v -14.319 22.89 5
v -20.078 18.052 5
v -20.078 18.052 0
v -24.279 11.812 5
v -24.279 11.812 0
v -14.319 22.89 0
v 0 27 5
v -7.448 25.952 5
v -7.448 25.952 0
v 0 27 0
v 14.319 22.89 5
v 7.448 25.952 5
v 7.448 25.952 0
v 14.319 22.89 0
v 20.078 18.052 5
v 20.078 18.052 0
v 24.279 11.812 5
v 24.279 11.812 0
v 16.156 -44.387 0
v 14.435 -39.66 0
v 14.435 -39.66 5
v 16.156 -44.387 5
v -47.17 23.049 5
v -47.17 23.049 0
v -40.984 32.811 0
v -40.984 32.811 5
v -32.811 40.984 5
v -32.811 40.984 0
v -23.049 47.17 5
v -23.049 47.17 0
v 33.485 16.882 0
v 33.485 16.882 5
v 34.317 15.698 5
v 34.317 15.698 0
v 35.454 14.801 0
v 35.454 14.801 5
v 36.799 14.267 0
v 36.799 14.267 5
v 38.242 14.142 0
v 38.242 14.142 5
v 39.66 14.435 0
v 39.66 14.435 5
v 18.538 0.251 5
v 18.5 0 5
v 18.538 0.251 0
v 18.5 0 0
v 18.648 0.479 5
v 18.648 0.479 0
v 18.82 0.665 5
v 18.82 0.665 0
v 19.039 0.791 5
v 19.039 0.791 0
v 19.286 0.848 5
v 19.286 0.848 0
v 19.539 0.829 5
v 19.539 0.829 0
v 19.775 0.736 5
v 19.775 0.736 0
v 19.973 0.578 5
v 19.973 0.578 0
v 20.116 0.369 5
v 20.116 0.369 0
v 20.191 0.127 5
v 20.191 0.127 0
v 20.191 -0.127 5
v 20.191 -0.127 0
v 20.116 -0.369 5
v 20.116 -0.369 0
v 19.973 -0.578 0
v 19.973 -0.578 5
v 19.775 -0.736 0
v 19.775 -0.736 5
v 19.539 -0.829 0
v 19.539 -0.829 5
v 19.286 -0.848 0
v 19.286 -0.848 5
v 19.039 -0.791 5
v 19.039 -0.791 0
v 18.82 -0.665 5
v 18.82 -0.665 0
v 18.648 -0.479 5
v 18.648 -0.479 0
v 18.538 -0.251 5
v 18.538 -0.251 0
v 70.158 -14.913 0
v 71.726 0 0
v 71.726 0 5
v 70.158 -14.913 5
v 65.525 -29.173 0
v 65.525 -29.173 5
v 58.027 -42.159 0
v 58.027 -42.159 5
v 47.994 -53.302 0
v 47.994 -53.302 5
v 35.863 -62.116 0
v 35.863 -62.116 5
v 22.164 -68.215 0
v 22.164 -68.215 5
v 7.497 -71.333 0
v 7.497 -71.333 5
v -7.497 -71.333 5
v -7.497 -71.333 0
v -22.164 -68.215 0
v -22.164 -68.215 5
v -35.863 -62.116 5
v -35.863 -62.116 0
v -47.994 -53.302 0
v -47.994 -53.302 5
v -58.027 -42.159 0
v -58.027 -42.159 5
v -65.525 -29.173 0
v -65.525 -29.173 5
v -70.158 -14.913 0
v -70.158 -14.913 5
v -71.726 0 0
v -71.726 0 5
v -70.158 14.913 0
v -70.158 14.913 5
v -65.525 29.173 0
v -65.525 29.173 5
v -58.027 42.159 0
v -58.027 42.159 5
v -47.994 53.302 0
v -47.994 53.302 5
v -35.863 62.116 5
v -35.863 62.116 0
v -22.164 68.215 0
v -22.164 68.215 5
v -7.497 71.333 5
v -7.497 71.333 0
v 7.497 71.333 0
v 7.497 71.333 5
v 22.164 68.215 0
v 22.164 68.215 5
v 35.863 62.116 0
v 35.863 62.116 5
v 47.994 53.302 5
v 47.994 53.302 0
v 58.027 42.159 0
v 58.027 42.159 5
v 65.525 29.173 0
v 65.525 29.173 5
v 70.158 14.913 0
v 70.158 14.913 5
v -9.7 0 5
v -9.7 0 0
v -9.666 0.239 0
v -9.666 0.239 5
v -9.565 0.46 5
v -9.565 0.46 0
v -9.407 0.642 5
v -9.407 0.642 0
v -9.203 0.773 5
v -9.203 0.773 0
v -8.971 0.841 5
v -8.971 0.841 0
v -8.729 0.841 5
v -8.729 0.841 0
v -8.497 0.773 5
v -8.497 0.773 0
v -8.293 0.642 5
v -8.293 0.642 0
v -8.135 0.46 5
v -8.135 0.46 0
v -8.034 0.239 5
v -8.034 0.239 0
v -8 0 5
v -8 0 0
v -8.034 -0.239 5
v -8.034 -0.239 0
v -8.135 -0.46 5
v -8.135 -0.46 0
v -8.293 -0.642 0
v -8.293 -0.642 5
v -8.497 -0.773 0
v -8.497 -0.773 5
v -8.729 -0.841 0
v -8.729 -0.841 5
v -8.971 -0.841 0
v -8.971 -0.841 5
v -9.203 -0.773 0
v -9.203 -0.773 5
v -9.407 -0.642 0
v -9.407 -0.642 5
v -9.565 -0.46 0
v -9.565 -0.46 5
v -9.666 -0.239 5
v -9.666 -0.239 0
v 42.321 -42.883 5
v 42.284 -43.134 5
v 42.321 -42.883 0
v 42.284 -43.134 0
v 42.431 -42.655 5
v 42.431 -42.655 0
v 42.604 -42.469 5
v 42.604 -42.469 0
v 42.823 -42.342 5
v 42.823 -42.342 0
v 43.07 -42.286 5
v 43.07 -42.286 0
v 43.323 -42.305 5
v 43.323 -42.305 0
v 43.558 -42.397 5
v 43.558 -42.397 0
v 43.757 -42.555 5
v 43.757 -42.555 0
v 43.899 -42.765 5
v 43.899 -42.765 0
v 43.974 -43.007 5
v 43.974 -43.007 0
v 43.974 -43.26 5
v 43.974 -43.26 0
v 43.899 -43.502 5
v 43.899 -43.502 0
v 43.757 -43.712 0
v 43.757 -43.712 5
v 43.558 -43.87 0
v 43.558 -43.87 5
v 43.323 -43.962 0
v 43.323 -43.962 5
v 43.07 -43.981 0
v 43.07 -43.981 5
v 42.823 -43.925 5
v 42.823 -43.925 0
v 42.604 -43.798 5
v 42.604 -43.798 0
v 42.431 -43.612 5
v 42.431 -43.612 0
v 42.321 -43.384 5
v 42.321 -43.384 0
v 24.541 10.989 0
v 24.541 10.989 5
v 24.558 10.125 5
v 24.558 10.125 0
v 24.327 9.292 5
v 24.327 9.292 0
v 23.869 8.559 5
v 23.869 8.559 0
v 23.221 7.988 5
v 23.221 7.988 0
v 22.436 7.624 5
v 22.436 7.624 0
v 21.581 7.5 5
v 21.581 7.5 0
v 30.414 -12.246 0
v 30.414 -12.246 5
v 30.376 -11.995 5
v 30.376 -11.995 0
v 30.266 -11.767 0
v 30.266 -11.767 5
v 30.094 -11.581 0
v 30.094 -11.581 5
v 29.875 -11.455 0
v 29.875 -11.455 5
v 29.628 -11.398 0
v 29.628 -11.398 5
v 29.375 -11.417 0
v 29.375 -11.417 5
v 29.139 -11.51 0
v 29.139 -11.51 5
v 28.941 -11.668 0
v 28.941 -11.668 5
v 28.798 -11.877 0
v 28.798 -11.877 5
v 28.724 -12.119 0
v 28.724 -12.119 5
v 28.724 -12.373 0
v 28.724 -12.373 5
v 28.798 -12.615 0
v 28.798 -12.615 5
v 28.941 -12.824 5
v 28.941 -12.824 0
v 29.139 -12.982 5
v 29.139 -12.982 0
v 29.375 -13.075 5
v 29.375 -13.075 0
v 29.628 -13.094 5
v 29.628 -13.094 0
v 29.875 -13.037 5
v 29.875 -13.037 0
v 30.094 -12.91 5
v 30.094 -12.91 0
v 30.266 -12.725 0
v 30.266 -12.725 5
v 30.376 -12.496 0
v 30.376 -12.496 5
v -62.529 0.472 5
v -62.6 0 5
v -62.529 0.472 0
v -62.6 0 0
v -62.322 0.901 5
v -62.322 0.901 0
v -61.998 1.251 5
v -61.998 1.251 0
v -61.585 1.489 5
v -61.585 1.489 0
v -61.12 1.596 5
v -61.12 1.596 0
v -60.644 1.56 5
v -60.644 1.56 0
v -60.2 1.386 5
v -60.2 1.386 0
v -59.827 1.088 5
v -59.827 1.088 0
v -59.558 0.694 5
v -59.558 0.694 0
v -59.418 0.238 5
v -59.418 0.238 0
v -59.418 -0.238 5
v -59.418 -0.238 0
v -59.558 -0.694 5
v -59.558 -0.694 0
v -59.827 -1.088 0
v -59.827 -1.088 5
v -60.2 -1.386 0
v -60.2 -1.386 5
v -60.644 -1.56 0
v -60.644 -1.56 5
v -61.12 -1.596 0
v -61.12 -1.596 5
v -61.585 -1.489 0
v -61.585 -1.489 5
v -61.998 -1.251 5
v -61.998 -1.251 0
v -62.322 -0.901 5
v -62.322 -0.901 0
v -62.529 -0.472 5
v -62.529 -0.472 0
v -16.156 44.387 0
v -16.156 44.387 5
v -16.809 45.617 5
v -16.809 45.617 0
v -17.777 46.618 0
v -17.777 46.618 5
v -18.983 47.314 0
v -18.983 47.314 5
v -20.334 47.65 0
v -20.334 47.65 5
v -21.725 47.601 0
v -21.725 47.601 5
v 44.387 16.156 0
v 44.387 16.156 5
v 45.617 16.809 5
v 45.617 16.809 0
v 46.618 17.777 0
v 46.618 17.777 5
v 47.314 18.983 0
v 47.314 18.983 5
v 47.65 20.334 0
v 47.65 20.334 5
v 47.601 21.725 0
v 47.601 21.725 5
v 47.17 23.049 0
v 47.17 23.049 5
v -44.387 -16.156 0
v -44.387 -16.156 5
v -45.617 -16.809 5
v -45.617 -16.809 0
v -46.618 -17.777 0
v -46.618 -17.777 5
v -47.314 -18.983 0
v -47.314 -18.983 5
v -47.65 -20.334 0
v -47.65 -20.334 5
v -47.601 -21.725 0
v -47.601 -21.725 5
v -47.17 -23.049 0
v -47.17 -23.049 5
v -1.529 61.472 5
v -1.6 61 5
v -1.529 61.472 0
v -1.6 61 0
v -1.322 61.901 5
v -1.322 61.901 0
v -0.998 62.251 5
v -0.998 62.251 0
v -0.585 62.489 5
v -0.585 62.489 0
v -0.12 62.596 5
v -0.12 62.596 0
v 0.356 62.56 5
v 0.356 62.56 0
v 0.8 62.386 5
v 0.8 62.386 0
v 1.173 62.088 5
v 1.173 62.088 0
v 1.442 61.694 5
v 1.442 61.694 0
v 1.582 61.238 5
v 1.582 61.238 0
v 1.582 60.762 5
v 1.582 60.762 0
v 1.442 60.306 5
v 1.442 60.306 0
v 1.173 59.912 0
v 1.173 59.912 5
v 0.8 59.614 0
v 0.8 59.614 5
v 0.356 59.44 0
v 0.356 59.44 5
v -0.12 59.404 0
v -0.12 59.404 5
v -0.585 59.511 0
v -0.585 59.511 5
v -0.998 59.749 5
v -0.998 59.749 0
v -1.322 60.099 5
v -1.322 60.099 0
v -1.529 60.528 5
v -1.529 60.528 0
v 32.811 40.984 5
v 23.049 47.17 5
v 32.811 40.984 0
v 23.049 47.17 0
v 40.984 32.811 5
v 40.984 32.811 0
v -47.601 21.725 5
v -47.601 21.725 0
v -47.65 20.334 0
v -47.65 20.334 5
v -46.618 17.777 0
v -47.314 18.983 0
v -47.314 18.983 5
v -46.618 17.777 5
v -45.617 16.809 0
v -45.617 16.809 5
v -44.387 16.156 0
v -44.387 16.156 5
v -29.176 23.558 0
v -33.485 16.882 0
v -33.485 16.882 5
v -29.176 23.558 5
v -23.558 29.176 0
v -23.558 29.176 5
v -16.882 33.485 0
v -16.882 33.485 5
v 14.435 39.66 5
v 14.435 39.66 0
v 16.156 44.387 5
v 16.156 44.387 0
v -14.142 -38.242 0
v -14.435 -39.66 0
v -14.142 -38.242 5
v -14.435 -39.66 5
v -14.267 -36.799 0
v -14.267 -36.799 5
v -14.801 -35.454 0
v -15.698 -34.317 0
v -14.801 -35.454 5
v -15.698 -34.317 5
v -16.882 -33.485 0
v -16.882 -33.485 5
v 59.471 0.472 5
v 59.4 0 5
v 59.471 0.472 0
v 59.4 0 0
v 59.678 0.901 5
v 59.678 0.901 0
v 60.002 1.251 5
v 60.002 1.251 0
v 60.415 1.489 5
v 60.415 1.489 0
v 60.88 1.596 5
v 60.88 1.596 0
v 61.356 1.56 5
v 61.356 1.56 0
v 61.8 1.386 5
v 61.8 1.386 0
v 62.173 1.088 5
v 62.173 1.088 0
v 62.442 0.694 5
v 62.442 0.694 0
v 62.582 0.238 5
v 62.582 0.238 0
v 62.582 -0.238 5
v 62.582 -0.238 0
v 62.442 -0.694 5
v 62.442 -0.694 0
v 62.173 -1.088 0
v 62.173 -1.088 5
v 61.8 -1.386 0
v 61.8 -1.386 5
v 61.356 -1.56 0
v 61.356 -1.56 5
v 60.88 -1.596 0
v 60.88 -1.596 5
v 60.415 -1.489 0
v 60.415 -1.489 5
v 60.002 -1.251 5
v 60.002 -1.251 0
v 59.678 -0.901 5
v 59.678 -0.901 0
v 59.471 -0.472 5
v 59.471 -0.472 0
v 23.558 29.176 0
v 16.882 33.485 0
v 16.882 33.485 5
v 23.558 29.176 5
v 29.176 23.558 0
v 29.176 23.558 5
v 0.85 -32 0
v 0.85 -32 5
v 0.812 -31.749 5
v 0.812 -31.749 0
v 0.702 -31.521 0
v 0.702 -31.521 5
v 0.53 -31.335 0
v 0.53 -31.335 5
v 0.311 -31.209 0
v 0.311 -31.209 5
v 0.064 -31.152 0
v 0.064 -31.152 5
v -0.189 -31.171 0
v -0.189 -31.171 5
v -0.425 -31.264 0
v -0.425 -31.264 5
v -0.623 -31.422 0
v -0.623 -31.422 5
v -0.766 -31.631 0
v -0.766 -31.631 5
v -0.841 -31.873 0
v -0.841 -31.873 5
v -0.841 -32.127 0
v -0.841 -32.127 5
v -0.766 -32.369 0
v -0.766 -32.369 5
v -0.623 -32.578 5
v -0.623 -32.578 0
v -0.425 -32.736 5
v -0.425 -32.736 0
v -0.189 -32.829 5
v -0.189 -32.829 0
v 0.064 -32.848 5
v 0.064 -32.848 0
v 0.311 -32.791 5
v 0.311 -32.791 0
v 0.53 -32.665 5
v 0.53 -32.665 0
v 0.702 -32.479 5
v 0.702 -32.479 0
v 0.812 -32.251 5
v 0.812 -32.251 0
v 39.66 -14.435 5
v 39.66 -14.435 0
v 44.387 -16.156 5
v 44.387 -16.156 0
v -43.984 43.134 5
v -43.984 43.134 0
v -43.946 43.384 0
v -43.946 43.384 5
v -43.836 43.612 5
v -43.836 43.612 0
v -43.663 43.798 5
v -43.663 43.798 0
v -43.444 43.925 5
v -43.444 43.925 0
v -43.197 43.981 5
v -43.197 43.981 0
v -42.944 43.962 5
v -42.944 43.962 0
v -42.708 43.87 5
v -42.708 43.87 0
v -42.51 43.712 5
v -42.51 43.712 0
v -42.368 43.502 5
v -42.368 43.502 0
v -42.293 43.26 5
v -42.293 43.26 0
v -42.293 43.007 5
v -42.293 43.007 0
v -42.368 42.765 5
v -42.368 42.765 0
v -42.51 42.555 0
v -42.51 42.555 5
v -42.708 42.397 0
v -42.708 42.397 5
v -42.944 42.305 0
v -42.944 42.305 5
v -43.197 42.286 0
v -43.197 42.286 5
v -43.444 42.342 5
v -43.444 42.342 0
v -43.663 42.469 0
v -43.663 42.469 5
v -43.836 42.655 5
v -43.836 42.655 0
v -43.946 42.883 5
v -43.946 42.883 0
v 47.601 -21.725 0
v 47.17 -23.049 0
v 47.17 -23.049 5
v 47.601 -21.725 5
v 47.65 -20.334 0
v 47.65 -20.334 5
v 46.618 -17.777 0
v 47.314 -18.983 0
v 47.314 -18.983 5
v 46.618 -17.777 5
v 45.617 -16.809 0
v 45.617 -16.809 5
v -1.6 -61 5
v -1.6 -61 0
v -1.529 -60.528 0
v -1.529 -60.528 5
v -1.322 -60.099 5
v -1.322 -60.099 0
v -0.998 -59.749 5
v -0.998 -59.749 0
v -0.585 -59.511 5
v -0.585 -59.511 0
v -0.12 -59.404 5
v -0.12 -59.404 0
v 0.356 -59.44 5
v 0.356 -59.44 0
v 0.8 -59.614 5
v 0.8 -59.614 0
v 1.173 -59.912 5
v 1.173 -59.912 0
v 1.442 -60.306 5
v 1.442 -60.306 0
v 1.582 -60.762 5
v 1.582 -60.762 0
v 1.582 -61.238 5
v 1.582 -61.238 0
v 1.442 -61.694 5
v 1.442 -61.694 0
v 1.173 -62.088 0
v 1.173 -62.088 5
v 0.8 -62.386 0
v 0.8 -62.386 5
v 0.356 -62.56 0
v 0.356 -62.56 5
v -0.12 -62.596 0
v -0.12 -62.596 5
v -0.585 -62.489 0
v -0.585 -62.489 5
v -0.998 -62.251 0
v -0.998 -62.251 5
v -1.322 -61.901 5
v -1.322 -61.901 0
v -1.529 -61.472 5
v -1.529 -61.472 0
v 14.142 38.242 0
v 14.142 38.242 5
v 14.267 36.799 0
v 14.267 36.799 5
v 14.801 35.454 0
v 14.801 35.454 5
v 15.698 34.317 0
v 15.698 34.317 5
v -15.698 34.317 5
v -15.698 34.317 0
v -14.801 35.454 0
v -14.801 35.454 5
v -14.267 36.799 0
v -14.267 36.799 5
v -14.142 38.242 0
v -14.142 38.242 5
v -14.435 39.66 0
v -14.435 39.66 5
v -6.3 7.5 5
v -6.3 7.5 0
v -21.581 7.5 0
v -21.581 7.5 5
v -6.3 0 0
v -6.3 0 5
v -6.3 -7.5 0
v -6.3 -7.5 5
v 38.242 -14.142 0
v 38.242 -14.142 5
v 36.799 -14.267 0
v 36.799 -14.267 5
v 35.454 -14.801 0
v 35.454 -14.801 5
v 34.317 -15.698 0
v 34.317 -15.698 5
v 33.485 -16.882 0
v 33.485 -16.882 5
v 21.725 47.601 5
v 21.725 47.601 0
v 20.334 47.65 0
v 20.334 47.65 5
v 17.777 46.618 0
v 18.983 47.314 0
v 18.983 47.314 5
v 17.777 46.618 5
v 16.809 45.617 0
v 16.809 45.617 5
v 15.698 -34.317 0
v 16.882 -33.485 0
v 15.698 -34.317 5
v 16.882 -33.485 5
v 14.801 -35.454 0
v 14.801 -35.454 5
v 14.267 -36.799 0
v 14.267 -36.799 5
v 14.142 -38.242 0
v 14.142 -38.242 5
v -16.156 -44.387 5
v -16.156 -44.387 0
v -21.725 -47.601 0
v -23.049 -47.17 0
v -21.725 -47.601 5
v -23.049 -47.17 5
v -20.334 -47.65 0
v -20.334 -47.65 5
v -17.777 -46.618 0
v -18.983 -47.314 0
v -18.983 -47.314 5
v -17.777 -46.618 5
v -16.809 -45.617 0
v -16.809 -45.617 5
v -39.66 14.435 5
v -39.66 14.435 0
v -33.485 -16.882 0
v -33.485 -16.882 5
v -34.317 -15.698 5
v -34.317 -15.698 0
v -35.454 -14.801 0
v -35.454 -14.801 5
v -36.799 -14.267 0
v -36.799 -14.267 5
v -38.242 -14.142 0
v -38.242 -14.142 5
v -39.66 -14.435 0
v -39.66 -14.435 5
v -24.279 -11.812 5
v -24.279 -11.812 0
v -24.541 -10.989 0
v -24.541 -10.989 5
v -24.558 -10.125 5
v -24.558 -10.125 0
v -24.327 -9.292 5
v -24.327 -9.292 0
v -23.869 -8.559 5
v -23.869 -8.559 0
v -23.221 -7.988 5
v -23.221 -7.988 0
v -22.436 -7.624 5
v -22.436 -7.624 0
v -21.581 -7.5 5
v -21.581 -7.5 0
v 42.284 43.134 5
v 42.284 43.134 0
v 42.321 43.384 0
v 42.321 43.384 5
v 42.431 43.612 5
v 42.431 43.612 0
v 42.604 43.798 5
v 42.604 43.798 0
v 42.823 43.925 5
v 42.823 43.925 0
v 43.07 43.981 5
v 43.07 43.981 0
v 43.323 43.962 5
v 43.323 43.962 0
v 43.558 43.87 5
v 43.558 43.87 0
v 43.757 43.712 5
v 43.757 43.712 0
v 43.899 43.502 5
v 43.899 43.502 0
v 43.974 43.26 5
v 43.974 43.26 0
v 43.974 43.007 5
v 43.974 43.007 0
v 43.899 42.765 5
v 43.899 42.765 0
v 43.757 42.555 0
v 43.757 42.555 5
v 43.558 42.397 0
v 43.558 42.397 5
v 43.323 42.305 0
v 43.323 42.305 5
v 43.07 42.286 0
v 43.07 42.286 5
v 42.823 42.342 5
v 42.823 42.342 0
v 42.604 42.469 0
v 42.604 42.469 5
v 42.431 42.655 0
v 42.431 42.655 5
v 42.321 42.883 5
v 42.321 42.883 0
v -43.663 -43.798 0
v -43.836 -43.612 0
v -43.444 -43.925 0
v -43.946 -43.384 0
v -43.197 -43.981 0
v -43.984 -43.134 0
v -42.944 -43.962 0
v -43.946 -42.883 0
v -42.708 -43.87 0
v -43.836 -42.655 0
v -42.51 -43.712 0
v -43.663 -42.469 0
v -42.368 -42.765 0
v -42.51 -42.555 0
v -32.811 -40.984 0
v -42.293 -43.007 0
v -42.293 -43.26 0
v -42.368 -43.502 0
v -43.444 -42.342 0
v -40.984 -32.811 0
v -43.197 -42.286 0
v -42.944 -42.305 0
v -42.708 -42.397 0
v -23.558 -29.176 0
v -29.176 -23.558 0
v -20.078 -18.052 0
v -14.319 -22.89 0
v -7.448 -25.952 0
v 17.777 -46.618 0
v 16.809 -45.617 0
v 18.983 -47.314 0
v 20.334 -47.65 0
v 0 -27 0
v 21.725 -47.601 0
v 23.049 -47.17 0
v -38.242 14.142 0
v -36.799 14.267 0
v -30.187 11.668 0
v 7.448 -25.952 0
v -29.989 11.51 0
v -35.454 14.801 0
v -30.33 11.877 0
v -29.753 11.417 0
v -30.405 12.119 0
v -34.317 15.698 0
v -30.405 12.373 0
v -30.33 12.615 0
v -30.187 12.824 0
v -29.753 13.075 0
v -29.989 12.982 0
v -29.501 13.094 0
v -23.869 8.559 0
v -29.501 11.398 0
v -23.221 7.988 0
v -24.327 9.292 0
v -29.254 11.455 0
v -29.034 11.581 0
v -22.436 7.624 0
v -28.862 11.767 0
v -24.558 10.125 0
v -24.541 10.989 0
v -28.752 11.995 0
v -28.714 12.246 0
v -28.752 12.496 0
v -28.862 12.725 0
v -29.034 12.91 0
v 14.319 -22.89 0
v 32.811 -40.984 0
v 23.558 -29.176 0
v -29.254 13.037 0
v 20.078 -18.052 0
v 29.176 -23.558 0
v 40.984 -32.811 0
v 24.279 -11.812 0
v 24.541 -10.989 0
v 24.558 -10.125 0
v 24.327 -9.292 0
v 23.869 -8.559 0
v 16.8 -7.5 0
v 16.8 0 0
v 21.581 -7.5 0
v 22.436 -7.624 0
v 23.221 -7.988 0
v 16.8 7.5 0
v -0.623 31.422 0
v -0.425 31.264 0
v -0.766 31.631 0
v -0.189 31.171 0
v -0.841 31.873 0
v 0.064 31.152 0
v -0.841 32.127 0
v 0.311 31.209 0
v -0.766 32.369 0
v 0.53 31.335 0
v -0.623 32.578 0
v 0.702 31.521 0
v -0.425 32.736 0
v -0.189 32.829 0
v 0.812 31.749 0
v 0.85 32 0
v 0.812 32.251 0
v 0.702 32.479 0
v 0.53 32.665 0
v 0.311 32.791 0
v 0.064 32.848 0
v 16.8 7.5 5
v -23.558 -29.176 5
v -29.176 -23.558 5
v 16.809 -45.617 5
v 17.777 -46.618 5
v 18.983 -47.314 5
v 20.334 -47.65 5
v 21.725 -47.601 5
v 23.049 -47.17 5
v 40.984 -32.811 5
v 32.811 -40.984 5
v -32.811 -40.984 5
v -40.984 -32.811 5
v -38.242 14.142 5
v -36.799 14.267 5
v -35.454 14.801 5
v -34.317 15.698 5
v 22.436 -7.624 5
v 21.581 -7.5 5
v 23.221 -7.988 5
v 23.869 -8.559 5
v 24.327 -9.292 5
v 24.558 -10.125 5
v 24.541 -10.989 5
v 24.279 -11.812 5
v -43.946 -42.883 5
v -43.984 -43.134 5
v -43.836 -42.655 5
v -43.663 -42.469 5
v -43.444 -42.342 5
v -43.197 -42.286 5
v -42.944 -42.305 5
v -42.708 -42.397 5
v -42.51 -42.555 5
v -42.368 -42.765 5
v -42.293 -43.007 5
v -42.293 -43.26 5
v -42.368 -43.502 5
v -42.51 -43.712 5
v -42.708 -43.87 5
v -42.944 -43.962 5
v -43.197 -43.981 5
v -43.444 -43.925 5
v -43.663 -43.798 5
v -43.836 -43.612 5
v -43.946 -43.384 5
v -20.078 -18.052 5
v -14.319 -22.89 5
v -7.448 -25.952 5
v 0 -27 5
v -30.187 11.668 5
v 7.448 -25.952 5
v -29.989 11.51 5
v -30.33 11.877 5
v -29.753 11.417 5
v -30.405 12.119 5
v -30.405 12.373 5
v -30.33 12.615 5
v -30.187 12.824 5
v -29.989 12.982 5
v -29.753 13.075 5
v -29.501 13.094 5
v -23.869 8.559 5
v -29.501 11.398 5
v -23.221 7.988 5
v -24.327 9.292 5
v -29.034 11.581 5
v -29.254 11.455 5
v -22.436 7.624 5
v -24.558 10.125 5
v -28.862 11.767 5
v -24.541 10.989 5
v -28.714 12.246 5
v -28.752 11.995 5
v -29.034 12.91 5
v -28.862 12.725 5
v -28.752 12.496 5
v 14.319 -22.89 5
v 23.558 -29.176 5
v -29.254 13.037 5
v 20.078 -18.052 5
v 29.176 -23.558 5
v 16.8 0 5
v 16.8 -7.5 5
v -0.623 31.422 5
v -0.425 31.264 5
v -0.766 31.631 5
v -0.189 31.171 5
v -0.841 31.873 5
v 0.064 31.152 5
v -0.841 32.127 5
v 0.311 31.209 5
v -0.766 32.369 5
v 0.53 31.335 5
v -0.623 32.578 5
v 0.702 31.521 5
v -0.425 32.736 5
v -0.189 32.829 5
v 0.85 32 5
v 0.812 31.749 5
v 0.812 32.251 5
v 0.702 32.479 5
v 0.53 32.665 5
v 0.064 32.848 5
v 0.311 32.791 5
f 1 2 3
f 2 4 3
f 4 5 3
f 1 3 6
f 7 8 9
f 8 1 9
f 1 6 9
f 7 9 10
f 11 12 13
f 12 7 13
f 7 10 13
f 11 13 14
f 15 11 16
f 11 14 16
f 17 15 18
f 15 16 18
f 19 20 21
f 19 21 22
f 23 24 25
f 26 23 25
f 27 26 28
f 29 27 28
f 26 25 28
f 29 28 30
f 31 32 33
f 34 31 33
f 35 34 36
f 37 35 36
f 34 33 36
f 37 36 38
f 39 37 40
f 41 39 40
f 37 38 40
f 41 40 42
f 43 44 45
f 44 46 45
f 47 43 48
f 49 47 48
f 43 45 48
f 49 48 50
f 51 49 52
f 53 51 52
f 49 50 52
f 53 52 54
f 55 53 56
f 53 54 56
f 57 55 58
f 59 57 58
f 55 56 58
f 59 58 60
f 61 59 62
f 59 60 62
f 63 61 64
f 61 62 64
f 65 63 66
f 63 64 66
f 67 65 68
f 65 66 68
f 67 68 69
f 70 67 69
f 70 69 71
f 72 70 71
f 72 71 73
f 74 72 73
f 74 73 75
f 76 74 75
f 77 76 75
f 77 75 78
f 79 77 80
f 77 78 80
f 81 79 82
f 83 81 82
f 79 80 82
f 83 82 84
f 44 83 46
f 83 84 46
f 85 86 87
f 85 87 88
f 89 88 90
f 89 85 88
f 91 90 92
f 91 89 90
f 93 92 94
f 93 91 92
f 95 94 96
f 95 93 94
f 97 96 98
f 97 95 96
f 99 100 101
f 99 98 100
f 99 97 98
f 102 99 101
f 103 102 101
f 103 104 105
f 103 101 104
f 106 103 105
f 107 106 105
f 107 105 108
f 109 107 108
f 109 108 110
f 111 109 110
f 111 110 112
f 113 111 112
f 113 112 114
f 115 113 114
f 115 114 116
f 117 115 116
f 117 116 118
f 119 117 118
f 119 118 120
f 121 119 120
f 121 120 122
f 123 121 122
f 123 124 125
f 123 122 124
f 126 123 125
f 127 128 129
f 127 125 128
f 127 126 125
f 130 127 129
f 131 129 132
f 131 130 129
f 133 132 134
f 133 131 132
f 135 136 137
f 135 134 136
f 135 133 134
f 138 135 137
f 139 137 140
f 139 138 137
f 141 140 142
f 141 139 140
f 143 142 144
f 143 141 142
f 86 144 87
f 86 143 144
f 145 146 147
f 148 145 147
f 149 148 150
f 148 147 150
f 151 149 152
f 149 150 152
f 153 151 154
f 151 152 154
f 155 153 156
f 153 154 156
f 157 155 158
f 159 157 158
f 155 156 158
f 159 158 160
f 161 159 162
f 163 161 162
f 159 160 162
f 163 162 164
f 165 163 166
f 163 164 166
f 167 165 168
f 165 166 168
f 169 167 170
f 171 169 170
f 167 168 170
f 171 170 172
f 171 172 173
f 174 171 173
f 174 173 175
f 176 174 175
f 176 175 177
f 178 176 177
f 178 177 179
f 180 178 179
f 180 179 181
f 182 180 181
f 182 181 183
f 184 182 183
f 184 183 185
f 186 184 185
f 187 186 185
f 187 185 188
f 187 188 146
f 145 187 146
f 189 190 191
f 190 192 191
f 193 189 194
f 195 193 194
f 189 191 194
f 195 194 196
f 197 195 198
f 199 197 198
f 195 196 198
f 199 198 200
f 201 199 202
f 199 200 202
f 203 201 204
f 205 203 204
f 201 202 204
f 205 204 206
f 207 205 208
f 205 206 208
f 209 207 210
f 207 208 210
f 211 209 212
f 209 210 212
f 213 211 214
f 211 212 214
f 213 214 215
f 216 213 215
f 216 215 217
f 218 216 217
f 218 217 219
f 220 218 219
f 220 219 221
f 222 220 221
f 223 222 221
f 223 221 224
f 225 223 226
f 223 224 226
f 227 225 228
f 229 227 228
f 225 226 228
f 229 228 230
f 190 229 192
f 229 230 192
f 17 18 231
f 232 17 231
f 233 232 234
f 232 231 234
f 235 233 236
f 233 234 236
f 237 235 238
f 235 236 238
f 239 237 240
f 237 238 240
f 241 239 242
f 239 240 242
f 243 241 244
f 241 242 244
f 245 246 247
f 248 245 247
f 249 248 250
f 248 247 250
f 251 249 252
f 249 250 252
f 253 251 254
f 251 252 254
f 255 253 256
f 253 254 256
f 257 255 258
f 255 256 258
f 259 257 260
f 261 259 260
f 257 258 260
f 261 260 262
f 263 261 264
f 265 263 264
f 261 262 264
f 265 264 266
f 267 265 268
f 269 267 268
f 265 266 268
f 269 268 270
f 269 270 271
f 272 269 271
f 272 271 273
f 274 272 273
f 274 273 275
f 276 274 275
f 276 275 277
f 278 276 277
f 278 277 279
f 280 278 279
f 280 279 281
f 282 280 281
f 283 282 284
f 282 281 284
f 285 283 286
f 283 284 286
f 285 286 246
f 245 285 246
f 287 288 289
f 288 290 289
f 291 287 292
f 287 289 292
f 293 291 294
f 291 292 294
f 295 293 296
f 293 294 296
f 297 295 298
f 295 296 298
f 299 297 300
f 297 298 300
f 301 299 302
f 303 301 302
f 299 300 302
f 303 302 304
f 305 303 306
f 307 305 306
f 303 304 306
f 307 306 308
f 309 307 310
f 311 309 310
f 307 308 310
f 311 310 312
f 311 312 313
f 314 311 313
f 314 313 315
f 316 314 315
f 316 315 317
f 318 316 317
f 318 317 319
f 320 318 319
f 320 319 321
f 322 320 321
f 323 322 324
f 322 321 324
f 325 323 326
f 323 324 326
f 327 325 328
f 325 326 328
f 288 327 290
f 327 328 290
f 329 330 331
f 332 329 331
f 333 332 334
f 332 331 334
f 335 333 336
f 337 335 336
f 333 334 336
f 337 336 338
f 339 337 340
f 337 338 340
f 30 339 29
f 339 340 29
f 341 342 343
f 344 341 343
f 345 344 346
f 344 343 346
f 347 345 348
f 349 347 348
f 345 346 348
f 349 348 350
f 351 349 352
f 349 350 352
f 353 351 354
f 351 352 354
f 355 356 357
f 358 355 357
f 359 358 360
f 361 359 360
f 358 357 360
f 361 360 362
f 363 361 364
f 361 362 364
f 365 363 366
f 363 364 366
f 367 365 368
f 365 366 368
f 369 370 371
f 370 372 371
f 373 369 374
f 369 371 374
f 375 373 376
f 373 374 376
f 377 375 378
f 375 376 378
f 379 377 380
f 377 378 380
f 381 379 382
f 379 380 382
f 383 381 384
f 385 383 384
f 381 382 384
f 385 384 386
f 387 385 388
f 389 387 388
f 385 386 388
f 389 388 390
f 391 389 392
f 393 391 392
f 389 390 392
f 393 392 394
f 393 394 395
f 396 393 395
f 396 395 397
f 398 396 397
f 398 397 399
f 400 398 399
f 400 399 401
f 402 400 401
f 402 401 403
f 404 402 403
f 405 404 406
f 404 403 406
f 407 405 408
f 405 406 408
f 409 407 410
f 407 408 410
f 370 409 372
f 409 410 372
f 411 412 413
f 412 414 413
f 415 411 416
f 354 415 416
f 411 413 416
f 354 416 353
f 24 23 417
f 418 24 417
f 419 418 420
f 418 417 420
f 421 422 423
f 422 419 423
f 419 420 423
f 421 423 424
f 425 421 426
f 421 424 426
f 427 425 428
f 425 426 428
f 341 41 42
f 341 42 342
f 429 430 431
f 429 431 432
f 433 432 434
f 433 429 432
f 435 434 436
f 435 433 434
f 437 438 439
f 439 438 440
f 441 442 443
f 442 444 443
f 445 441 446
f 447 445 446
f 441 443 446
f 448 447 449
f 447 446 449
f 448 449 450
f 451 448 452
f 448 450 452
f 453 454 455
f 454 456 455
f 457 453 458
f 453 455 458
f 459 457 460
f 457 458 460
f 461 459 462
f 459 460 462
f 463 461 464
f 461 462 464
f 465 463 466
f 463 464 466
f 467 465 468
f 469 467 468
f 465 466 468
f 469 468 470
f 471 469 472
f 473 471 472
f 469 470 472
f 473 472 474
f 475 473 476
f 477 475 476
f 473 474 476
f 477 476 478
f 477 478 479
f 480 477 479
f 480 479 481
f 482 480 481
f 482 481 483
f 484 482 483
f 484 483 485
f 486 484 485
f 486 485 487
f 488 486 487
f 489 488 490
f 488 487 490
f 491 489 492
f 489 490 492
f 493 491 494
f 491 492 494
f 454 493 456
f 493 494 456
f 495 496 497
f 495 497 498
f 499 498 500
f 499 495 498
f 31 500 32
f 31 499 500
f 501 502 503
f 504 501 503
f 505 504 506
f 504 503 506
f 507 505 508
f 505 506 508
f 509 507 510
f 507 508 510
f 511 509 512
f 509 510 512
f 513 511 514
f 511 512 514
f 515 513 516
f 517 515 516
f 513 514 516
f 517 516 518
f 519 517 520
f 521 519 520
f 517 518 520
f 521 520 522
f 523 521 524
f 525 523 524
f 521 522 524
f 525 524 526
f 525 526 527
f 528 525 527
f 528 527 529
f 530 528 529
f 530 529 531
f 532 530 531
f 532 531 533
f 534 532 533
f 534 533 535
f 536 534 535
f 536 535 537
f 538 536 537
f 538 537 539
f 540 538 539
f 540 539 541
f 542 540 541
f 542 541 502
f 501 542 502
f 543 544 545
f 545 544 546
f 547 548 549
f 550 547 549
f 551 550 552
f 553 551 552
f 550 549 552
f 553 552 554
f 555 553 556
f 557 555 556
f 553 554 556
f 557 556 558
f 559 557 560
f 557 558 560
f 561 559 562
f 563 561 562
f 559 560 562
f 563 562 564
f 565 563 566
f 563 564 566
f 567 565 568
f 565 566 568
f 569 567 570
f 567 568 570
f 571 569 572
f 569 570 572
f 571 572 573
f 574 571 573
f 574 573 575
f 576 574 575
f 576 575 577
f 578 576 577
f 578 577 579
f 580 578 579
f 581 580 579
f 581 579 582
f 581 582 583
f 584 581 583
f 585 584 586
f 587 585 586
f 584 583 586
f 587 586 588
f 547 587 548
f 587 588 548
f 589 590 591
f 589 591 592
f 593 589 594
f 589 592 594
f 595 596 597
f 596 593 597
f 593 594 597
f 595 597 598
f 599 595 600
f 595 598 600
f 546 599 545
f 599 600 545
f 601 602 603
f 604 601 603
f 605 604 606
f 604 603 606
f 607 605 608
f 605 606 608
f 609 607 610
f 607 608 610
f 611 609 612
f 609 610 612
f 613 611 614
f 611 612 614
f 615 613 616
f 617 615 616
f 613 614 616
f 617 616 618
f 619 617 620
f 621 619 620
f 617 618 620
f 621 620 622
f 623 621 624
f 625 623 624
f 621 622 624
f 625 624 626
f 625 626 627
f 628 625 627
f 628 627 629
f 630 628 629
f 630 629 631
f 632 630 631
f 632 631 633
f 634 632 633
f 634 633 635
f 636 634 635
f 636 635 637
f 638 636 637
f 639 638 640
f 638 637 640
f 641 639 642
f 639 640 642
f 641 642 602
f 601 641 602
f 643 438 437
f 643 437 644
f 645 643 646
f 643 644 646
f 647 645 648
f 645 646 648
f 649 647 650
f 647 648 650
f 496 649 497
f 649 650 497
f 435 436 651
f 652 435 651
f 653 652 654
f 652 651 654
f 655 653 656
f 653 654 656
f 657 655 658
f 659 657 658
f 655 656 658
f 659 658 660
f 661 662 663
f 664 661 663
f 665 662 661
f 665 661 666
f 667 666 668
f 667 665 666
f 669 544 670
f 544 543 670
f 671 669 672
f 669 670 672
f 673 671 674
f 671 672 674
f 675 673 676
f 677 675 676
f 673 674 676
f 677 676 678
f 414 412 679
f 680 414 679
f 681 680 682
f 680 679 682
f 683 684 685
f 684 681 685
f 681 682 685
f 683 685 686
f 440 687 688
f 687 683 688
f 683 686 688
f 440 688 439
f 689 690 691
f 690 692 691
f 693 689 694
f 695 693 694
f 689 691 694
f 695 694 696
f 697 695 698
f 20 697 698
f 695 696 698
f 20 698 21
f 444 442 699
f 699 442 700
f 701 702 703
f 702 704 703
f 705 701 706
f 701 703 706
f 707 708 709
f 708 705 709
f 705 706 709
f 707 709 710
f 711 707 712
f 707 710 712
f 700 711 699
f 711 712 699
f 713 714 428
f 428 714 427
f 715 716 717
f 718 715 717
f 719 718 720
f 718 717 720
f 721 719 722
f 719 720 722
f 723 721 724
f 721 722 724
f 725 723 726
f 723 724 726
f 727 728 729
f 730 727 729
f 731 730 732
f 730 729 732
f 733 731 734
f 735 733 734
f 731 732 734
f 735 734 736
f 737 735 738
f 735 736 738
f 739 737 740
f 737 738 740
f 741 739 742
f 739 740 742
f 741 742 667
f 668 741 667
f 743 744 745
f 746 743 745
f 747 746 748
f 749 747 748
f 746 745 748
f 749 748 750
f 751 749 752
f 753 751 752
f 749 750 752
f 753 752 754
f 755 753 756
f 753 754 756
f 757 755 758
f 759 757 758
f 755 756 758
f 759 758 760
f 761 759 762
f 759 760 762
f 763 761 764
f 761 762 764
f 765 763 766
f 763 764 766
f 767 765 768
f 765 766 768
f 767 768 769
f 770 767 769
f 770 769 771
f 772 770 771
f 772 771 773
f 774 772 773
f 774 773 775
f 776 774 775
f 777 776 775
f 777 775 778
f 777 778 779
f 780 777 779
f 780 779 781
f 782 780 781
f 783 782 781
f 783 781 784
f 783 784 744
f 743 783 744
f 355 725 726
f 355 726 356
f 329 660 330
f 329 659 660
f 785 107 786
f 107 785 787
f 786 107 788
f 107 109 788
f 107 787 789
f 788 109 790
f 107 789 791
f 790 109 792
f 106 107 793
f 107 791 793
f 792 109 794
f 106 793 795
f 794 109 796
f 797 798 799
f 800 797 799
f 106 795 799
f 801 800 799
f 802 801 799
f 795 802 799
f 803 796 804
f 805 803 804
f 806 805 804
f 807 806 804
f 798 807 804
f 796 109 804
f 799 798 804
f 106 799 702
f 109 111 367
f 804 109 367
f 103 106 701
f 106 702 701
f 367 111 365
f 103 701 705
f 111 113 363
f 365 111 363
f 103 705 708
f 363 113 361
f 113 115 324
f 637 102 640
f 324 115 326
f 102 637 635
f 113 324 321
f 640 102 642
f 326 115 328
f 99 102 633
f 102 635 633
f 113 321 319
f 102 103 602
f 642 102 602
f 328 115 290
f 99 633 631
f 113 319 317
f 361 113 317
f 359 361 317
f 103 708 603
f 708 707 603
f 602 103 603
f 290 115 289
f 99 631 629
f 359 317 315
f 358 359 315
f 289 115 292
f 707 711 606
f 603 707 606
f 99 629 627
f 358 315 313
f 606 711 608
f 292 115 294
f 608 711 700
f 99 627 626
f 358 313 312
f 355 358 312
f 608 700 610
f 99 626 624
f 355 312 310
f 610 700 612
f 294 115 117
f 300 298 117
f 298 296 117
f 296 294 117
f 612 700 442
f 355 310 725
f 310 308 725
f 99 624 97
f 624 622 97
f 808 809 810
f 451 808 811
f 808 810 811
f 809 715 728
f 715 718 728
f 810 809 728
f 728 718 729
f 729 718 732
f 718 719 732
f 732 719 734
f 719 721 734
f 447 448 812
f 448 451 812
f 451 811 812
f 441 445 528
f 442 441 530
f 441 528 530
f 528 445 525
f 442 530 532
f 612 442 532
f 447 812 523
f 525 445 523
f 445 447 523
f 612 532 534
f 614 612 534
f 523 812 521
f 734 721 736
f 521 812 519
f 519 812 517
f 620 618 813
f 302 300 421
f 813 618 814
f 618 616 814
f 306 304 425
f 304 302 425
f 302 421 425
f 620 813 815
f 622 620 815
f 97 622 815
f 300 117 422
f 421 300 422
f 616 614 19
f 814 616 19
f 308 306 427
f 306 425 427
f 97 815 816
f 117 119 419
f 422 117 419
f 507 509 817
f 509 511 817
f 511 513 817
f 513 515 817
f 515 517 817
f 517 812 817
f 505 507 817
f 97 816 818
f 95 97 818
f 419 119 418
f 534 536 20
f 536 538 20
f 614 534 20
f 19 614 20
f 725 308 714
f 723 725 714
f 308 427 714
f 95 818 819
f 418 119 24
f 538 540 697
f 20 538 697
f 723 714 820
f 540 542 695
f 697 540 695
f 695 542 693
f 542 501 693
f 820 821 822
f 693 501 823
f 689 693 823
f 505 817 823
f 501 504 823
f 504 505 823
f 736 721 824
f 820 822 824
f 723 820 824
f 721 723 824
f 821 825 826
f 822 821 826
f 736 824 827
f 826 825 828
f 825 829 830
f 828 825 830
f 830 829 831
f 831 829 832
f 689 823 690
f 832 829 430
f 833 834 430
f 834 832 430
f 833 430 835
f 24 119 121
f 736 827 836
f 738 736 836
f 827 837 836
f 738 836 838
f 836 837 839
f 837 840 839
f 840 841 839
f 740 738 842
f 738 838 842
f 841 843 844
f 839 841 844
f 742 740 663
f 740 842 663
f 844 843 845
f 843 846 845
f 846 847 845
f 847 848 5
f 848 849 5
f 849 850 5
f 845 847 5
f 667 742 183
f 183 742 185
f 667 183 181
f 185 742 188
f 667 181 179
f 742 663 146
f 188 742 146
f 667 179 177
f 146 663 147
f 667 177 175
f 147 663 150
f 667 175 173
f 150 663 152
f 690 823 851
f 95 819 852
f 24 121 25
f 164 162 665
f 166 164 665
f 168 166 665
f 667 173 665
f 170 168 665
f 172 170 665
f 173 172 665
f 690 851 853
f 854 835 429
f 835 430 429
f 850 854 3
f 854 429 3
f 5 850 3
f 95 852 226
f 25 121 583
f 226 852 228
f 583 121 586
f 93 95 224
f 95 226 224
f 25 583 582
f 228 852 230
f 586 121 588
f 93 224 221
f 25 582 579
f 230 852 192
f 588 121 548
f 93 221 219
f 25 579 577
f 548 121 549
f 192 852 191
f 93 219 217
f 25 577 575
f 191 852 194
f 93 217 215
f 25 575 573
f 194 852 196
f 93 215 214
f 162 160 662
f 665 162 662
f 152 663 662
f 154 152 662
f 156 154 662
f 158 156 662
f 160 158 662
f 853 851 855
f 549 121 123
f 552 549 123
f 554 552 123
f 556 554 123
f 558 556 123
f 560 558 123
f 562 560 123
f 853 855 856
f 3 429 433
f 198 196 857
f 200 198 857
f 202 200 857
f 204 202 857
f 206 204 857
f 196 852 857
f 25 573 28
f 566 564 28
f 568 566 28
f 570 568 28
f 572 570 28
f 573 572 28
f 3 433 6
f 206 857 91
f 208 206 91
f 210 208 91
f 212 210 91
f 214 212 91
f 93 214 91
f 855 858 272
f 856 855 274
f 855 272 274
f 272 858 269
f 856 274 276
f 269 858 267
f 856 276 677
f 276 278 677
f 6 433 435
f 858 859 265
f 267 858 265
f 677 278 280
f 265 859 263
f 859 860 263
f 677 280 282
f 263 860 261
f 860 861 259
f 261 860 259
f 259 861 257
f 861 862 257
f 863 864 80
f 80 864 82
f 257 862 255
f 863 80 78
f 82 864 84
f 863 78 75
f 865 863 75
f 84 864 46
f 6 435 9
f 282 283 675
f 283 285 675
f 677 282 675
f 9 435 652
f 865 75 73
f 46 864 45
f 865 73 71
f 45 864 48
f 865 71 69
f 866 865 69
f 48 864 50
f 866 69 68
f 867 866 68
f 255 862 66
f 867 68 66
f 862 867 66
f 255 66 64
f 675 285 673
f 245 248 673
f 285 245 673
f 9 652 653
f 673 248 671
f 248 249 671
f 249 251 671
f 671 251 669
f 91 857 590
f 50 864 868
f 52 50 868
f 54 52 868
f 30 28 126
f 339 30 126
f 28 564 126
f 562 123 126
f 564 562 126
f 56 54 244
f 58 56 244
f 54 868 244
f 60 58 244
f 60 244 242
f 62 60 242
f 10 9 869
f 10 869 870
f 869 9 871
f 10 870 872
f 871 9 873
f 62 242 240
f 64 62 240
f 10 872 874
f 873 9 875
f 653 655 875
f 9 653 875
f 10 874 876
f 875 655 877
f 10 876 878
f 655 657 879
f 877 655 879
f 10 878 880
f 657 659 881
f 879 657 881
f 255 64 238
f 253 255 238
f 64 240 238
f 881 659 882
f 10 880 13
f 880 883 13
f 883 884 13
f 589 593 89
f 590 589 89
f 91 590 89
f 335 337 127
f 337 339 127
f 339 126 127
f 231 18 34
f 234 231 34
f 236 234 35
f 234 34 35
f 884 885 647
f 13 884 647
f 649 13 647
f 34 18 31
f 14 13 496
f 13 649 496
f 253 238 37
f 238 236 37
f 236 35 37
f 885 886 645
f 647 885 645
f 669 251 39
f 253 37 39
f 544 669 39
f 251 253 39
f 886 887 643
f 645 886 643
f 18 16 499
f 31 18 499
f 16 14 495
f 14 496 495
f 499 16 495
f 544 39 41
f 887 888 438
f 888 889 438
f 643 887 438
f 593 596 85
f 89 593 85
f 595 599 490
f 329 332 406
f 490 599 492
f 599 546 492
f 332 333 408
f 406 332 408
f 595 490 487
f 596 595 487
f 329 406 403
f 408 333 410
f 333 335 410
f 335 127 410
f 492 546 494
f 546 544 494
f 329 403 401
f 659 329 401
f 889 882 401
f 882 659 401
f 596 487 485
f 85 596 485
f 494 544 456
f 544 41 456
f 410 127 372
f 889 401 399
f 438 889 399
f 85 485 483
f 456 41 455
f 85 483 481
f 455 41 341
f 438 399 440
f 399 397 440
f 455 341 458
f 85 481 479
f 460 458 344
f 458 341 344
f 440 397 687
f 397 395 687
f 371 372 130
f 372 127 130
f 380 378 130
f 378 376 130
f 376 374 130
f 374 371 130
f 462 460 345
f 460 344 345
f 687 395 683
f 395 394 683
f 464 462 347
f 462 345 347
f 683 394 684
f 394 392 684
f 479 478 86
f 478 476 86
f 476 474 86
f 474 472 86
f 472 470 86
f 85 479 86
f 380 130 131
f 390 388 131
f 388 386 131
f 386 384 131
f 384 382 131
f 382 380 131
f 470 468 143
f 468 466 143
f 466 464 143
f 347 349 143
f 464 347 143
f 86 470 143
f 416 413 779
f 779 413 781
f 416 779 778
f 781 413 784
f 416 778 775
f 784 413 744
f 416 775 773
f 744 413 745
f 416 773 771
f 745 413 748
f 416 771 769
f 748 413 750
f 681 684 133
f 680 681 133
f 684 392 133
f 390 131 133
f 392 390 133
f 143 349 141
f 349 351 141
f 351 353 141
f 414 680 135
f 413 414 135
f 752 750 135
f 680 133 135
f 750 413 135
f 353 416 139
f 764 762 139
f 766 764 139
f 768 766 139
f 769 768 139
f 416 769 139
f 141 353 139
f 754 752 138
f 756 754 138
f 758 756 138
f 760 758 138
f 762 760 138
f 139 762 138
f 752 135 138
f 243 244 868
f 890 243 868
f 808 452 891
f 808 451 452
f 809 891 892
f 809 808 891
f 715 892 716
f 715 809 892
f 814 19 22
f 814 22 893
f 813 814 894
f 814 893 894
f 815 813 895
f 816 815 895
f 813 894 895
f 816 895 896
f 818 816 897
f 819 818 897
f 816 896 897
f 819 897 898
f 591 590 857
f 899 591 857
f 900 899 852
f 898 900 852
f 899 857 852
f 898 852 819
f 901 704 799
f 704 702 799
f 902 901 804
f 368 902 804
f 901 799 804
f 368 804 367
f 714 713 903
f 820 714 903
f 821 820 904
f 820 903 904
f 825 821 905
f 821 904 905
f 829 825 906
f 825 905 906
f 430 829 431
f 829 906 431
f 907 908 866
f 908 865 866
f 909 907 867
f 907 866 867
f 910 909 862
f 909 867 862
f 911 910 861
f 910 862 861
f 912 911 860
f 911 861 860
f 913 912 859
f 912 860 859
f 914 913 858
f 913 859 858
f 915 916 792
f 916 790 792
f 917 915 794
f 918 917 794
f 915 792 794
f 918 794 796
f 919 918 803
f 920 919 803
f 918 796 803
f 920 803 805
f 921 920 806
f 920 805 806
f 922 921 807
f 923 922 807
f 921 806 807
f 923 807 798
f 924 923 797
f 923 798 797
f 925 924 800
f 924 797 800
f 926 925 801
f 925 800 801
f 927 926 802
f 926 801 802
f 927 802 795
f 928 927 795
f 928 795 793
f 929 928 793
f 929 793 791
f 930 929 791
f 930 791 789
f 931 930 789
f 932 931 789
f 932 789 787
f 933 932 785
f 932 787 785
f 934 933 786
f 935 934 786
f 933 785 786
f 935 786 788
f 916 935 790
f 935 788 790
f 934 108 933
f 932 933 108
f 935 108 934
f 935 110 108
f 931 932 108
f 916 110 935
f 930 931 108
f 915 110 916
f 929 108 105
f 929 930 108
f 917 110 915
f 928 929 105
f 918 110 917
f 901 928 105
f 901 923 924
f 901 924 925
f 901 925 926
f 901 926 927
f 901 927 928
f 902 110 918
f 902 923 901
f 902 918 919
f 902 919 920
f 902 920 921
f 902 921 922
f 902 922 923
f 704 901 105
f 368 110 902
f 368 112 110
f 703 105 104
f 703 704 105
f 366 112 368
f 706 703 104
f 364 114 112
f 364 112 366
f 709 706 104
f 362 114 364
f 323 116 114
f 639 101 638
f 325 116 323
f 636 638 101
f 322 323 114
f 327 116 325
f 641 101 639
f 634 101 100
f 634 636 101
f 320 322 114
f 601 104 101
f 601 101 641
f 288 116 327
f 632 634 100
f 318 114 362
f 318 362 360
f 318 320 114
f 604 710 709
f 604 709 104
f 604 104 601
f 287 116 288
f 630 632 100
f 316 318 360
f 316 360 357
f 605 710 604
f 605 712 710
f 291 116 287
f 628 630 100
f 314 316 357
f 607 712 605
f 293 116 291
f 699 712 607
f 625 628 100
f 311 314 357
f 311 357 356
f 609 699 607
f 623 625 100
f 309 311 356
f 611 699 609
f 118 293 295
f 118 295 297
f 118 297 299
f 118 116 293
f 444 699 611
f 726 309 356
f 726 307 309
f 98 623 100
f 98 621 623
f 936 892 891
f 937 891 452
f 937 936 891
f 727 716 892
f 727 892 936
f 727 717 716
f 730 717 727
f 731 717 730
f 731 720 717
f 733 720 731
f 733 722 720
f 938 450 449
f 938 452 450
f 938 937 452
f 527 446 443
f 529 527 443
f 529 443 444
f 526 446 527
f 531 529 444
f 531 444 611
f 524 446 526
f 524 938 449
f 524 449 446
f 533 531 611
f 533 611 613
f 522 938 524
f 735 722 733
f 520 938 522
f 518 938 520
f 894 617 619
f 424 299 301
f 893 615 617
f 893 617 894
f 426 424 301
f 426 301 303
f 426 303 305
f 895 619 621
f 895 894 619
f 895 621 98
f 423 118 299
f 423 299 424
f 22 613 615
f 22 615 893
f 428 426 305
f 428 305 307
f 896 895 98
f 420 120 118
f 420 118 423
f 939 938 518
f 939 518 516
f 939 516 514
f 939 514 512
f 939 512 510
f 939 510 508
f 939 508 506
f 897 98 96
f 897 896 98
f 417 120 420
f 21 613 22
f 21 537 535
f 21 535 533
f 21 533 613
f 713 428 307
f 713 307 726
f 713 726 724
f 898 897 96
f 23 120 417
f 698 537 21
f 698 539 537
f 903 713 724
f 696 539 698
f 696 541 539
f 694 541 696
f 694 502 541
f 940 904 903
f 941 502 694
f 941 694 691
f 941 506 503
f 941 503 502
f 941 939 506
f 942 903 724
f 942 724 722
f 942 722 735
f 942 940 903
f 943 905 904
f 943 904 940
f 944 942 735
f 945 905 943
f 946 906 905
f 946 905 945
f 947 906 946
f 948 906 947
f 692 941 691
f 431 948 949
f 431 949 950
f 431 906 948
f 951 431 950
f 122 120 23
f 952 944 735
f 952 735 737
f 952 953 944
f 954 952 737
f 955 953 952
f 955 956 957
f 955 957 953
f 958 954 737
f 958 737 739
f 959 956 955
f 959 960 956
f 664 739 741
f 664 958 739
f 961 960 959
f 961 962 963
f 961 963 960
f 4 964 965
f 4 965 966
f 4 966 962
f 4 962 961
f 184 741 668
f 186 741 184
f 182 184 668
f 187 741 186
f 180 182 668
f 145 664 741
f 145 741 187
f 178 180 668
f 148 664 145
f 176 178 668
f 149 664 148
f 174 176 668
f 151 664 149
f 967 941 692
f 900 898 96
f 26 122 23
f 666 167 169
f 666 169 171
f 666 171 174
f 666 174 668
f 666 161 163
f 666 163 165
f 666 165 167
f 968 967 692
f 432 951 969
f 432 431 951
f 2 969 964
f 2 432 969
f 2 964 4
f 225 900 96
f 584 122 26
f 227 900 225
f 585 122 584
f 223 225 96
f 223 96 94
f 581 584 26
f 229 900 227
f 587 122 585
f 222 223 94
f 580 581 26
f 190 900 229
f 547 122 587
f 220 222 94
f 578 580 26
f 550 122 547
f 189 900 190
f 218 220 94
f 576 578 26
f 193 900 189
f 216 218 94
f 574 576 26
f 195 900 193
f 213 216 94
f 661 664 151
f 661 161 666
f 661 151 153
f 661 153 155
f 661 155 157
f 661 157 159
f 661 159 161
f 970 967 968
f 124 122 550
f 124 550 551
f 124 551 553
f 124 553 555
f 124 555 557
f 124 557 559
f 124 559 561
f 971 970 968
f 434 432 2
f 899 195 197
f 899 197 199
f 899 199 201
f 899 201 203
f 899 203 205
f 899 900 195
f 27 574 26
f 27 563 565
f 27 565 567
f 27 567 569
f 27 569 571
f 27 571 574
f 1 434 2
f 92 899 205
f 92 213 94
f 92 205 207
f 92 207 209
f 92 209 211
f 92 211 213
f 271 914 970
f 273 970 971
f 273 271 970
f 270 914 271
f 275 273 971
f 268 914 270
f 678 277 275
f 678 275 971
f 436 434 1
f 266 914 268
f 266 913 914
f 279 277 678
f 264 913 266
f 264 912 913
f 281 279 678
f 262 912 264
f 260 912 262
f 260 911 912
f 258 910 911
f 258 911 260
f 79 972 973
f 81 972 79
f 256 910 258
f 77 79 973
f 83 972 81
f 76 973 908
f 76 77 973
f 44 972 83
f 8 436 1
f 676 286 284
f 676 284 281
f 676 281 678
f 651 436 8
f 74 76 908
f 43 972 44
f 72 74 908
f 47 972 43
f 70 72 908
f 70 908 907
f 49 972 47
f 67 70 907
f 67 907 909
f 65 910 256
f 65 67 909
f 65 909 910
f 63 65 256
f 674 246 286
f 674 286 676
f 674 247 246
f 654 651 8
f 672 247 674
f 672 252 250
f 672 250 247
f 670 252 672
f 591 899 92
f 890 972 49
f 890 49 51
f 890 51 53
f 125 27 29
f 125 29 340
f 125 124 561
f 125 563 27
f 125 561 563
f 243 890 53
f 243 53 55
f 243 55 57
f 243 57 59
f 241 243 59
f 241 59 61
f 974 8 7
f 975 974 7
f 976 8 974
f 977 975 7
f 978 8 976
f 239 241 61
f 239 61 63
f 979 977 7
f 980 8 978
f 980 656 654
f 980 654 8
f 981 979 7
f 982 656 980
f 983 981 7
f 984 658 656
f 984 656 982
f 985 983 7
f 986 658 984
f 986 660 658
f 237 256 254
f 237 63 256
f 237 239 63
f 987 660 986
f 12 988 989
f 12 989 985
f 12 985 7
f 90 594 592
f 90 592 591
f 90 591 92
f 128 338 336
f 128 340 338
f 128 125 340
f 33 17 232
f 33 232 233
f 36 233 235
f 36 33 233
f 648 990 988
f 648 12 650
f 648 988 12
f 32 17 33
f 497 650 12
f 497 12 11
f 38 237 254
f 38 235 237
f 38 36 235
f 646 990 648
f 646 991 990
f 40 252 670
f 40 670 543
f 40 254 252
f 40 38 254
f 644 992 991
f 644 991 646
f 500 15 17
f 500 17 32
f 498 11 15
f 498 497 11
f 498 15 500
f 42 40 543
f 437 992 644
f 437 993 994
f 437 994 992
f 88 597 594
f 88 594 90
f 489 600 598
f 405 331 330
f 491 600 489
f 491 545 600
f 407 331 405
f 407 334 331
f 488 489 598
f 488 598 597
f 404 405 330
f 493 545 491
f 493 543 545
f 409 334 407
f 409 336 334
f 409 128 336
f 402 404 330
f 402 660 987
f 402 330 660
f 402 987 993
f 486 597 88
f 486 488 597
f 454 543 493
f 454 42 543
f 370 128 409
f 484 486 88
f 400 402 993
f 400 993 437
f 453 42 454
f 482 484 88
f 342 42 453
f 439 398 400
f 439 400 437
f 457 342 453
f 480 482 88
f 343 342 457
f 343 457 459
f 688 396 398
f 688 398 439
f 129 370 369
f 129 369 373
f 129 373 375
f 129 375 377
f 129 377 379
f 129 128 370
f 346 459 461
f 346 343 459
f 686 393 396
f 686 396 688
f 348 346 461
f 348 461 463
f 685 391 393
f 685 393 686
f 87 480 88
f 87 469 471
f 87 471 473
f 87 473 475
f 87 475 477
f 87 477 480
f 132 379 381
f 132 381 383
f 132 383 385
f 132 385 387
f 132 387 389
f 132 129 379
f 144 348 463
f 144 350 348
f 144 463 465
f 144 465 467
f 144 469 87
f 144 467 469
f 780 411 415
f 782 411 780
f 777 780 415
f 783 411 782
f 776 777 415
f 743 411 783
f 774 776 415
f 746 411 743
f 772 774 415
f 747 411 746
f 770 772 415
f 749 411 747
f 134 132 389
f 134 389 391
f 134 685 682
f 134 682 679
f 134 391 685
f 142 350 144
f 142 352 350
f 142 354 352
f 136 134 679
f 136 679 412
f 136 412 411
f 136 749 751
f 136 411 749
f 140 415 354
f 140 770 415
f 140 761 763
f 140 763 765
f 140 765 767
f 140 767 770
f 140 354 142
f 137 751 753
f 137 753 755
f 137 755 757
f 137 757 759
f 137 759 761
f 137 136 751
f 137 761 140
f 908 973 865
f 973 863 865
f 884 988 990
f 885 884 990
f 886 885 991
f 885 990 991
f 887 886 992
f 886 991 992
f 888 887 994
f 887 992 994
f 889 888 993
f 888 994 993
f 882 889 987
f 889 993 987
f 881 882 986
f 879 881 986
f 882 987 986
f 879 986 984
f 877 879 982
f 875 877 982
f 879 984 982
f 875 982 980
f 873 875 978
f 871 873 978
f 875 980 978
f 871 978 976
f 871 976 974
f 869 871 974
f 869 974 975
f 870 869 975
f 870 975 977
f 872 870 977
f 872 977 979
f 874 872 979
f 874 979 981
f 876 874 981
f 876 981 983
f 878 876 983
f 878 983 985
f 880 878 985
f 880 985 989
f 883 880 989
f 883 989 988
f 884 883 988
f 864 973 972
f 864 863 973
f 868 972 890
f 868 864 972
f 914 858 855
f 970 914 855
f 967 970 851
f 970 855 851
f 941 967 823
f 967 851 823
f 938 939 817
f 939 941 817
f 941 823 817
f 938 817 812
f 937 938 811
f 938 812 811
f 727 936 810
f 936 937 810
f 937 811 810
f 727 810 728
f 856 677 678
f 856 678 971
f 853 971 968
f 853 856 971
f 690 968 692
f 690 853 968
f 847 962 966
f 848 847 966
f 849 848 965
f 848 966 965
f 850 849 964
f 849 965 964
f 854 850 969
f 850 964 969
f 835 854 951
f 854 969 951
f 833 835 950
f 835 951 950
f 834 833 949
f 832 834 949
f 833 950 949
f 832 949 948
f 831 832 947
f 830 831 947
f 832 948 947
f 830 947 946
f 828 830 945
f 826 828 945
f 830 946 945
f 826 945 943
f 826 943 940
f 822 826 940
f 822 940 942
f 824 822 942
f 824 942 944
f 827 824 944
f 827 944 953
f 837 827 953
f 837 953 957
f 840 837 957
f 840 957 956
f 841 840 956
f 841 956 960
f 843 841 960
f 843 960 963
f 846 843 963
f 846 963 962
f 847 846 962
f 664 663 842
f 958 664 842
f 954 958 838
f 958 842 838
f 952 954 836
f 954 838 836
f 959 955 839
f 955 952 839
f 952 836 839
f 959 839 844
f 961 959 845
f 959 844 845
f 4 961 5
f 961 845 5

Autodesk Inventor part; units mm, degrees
ref_plane "YZ Plane" through (0, 0, 0) normal (1, 0, 0) x (0, 1, 0)
ref_plane "XZ Plane" through (0, 0, 0) normal (0, 1, 0) x (-1, 0, 0)
ref_plane "XY Plane" through (0, 0, 0) normal (0, 0, 1) x (1, 0, 0)
sketch "스케치1" plane through (0, 0, 0) normal (0, 0, 1) x (1, 0, 0)
  circle A0 centre (0, 0) radius 27
  circle A1 centre (0, 0) radius 71.7255
  dimension "d0" = 54
  dimension "d1" = 143.451
extrude "돌출1" add sketch "스케치1" along normal blind 5
sketch "스케치2" plane through (0, 0, 5) normal (0, 0, 1) x (1, 0, 0)
  circle A0 centre (0, 0) radius 32
  circle A1 centre (0, 32) radius 0.85
  circle A2 centre (0, -32) radius 0.85
  line L0 (0, 0) -> (0, -32) construction
  line L1 (0, 0) -> (29.5641, -12.2459) construction
  circle A3 centre (29.5641, -12.2459) radius 0.85
  line L2 (0, 0) -> (-29.5641, 12.2459) construction
  circle A4 centre (-29.5641, 12.2459) radius 0.85
  dimension "d4" = 64
  dimension "d5" = 1.7
  dimension "d6" = 1.7
  dimension "d7" = 1.7
  dimension "d8" = 67.5
  dimension "d9" = 1.7
extrude "돌출2" cut sketch "스케치2" against normal blind 10 contours A1 A0 | A0 A1 | A3 A0 | A0 A3 | A4 A0 | A0 A4 | A2 A0 | A0 A2
sketch "스케치3" plane through (0, 0, 0) normal (0, 0, -1) x (-1, 0, 0)
  circle A0 centre (0, 0) radius 61
  circle A1 centre (61, 0) radius 1.6
  circle A2 centre (0, 61) radius 1.6
  circle A3 centre (-61, 0) radius 1.6
  circle A4 centre (0, -61) radius 1.6
  dimension "d12" = 122
  dimension "d13" = 3.2
  dimension "d16" = 360
extrude "돌출3" cut sketch "스케치3" against normal blind 10 contours A0 A1 | A0 A1 | A2 A0 | A0 A2 | A4 A0 | A0 A4 | A3 A0 | A0 A3
sketch "스케치4" plane through (0, 0, 0) normal (0, 0, -1) x (-1, 0, 0)
  circle A0 centre (0, 0) radius 2.5
  line L0 (0, 0) -> (8.85, 0)
  line L1 (0, 0) -> (-19.35, 0)
  circle A1 centre (8.85, 0) radius 0.85
  circle A2 centre (-19.35, 0) radius 0.85
  line L2 (-29.4038, 7.5) -> (29.4038, 7.5)
  line L3 (29.4038, 7.5) -> (29.4038, -7.5)
  line L4 (29.4038, -7.5) -> (-29.4038, -7.5)
  line L5 (-29.4038, -7.5) -> (-29.4038, 7.5)
  line L6 (-29.4038, 7.5) -> (29.4038, -7.5) construction
  line L7 (29.4038, 7.5) -> (-29.4038, -7.5) construction
  line L8 (-5, -7.5) -> (6.3, -7.5)
  line L9 (10.85, 7.5) -> (6.3, 7.5)
  line L10 (6.3, 7.5) -> (6.3, -7.5)
  line L11 (6.3, -7.5) -> (10.85, -7.5)
  line L12 (10.85, -7.5) -> (10.85, 7.5) construction
  line L13 (-16.8, 7.5) -> (-21.35, 7.5)
  line L14 (-21.35, 7.5) -> (-21.35, -7.5) construction
  line L15 (-21.35, -7.5) -> (-16.8, -7.5)
  line L16 (-16.8, -7.5) -> (-16.8, 7.5)
  point P0 (-16.8, -7.5)
  point P1 (6.3, -7.5)
  point P2 (6.3, 7.5)
  dimension "d20" = 5
  dimension "d21" = 8.85
  dimension "d22" = 19.35
  dimension "d23" = 1.7
  dimension "d24" = 1.7
  dimension "d25" = 15
  dimension "d29" = 16.8
  dimension "d30" = 21.35
  dimension "d31" = 10.85
  dimension "d32" = 6.3
extrude "돌출4" add sketch "스케치4" against normal blind 5 contours L10 L2 L3 L4 | L16 L4 L5 L2
fillet "모깎기1" radius 3 4 edges at (25.9374, -7.5, 2.5) (-25.9374, -7.5, 2.5) (-25.9374, 7.5, 2.5) (25.9374, 7.5, 2.5)
sketch "스케치6" plane through (0, 0, 0) normal (0, 0, -1) x (-1, 0, 0)
  circle A0 centre (0, 0) radius 52.5
  circle A1 centre (0, 0) radius 37.5
  line L0 (0, 0) -> (0, -83.3327)
  line L1 (0, 0) -> (22.8876, -62.8832)
  line L2 (0, 0) -> (58.8648, -21.425)
  point P0 (49.3339, -17.9561)
  point P1 (35.2385, -12.8258)
  point P2 (12.8258, -35.2385)
  point P3 (17.9561, -49.3339)
  dimension "d34" = 105
  dimension "d35" = 75
  dimension "d36" = 20
  dimension "d37" = 50
extrude "돌출5" cut sketch "스케치6" against normal blind 5 contours A0 L1 A1 L2
fillet "모깎기2" radius 5 4 edges at (-35.2385, -12.8258, 2.5) (-49.3339, -17.9561, 2.5) (-17.9561, -49.3339, 2.5) (-12.8258, -35.2385, 2.5)
pattern_circular "원형 패턴1" count 4 over 360 about axis through (0, 0, 0) along (0, 0, 1) of "돌출5", "모깎기2"
sketch "스케치7" plane through (0, 0, 0) normal (0, 0, -1) x (-1, 0, 0)
  circle A0 centre (0, -61) radius 1.6 projected
  circle A1 centre (0, 0) radius 61 construction
  circle A2 centre (43.1335, -43.1335) radius 0.85
  line L0 (43.1335, -43.1335) -> (0, 0) construction
  line L1 (0, 0) -> (0, -16.1996)
  circle A3 centre (43.1335, 43.1335) radius 0.85
  circle A4 centre (-43.1335, 43.1335) radius 0.85
  circle A5 centre (-43.1335, -43.1335) radius 0.85
  dimension "d44" = 1.7
  dimension "d45" = 45
  dimension "d48" = 360
extrude "돌출6" cut sketch "스케치7" against normal blind 5 contours A2 | A3 | A4 | A5
properties part number "아크릴 빛번짐"
